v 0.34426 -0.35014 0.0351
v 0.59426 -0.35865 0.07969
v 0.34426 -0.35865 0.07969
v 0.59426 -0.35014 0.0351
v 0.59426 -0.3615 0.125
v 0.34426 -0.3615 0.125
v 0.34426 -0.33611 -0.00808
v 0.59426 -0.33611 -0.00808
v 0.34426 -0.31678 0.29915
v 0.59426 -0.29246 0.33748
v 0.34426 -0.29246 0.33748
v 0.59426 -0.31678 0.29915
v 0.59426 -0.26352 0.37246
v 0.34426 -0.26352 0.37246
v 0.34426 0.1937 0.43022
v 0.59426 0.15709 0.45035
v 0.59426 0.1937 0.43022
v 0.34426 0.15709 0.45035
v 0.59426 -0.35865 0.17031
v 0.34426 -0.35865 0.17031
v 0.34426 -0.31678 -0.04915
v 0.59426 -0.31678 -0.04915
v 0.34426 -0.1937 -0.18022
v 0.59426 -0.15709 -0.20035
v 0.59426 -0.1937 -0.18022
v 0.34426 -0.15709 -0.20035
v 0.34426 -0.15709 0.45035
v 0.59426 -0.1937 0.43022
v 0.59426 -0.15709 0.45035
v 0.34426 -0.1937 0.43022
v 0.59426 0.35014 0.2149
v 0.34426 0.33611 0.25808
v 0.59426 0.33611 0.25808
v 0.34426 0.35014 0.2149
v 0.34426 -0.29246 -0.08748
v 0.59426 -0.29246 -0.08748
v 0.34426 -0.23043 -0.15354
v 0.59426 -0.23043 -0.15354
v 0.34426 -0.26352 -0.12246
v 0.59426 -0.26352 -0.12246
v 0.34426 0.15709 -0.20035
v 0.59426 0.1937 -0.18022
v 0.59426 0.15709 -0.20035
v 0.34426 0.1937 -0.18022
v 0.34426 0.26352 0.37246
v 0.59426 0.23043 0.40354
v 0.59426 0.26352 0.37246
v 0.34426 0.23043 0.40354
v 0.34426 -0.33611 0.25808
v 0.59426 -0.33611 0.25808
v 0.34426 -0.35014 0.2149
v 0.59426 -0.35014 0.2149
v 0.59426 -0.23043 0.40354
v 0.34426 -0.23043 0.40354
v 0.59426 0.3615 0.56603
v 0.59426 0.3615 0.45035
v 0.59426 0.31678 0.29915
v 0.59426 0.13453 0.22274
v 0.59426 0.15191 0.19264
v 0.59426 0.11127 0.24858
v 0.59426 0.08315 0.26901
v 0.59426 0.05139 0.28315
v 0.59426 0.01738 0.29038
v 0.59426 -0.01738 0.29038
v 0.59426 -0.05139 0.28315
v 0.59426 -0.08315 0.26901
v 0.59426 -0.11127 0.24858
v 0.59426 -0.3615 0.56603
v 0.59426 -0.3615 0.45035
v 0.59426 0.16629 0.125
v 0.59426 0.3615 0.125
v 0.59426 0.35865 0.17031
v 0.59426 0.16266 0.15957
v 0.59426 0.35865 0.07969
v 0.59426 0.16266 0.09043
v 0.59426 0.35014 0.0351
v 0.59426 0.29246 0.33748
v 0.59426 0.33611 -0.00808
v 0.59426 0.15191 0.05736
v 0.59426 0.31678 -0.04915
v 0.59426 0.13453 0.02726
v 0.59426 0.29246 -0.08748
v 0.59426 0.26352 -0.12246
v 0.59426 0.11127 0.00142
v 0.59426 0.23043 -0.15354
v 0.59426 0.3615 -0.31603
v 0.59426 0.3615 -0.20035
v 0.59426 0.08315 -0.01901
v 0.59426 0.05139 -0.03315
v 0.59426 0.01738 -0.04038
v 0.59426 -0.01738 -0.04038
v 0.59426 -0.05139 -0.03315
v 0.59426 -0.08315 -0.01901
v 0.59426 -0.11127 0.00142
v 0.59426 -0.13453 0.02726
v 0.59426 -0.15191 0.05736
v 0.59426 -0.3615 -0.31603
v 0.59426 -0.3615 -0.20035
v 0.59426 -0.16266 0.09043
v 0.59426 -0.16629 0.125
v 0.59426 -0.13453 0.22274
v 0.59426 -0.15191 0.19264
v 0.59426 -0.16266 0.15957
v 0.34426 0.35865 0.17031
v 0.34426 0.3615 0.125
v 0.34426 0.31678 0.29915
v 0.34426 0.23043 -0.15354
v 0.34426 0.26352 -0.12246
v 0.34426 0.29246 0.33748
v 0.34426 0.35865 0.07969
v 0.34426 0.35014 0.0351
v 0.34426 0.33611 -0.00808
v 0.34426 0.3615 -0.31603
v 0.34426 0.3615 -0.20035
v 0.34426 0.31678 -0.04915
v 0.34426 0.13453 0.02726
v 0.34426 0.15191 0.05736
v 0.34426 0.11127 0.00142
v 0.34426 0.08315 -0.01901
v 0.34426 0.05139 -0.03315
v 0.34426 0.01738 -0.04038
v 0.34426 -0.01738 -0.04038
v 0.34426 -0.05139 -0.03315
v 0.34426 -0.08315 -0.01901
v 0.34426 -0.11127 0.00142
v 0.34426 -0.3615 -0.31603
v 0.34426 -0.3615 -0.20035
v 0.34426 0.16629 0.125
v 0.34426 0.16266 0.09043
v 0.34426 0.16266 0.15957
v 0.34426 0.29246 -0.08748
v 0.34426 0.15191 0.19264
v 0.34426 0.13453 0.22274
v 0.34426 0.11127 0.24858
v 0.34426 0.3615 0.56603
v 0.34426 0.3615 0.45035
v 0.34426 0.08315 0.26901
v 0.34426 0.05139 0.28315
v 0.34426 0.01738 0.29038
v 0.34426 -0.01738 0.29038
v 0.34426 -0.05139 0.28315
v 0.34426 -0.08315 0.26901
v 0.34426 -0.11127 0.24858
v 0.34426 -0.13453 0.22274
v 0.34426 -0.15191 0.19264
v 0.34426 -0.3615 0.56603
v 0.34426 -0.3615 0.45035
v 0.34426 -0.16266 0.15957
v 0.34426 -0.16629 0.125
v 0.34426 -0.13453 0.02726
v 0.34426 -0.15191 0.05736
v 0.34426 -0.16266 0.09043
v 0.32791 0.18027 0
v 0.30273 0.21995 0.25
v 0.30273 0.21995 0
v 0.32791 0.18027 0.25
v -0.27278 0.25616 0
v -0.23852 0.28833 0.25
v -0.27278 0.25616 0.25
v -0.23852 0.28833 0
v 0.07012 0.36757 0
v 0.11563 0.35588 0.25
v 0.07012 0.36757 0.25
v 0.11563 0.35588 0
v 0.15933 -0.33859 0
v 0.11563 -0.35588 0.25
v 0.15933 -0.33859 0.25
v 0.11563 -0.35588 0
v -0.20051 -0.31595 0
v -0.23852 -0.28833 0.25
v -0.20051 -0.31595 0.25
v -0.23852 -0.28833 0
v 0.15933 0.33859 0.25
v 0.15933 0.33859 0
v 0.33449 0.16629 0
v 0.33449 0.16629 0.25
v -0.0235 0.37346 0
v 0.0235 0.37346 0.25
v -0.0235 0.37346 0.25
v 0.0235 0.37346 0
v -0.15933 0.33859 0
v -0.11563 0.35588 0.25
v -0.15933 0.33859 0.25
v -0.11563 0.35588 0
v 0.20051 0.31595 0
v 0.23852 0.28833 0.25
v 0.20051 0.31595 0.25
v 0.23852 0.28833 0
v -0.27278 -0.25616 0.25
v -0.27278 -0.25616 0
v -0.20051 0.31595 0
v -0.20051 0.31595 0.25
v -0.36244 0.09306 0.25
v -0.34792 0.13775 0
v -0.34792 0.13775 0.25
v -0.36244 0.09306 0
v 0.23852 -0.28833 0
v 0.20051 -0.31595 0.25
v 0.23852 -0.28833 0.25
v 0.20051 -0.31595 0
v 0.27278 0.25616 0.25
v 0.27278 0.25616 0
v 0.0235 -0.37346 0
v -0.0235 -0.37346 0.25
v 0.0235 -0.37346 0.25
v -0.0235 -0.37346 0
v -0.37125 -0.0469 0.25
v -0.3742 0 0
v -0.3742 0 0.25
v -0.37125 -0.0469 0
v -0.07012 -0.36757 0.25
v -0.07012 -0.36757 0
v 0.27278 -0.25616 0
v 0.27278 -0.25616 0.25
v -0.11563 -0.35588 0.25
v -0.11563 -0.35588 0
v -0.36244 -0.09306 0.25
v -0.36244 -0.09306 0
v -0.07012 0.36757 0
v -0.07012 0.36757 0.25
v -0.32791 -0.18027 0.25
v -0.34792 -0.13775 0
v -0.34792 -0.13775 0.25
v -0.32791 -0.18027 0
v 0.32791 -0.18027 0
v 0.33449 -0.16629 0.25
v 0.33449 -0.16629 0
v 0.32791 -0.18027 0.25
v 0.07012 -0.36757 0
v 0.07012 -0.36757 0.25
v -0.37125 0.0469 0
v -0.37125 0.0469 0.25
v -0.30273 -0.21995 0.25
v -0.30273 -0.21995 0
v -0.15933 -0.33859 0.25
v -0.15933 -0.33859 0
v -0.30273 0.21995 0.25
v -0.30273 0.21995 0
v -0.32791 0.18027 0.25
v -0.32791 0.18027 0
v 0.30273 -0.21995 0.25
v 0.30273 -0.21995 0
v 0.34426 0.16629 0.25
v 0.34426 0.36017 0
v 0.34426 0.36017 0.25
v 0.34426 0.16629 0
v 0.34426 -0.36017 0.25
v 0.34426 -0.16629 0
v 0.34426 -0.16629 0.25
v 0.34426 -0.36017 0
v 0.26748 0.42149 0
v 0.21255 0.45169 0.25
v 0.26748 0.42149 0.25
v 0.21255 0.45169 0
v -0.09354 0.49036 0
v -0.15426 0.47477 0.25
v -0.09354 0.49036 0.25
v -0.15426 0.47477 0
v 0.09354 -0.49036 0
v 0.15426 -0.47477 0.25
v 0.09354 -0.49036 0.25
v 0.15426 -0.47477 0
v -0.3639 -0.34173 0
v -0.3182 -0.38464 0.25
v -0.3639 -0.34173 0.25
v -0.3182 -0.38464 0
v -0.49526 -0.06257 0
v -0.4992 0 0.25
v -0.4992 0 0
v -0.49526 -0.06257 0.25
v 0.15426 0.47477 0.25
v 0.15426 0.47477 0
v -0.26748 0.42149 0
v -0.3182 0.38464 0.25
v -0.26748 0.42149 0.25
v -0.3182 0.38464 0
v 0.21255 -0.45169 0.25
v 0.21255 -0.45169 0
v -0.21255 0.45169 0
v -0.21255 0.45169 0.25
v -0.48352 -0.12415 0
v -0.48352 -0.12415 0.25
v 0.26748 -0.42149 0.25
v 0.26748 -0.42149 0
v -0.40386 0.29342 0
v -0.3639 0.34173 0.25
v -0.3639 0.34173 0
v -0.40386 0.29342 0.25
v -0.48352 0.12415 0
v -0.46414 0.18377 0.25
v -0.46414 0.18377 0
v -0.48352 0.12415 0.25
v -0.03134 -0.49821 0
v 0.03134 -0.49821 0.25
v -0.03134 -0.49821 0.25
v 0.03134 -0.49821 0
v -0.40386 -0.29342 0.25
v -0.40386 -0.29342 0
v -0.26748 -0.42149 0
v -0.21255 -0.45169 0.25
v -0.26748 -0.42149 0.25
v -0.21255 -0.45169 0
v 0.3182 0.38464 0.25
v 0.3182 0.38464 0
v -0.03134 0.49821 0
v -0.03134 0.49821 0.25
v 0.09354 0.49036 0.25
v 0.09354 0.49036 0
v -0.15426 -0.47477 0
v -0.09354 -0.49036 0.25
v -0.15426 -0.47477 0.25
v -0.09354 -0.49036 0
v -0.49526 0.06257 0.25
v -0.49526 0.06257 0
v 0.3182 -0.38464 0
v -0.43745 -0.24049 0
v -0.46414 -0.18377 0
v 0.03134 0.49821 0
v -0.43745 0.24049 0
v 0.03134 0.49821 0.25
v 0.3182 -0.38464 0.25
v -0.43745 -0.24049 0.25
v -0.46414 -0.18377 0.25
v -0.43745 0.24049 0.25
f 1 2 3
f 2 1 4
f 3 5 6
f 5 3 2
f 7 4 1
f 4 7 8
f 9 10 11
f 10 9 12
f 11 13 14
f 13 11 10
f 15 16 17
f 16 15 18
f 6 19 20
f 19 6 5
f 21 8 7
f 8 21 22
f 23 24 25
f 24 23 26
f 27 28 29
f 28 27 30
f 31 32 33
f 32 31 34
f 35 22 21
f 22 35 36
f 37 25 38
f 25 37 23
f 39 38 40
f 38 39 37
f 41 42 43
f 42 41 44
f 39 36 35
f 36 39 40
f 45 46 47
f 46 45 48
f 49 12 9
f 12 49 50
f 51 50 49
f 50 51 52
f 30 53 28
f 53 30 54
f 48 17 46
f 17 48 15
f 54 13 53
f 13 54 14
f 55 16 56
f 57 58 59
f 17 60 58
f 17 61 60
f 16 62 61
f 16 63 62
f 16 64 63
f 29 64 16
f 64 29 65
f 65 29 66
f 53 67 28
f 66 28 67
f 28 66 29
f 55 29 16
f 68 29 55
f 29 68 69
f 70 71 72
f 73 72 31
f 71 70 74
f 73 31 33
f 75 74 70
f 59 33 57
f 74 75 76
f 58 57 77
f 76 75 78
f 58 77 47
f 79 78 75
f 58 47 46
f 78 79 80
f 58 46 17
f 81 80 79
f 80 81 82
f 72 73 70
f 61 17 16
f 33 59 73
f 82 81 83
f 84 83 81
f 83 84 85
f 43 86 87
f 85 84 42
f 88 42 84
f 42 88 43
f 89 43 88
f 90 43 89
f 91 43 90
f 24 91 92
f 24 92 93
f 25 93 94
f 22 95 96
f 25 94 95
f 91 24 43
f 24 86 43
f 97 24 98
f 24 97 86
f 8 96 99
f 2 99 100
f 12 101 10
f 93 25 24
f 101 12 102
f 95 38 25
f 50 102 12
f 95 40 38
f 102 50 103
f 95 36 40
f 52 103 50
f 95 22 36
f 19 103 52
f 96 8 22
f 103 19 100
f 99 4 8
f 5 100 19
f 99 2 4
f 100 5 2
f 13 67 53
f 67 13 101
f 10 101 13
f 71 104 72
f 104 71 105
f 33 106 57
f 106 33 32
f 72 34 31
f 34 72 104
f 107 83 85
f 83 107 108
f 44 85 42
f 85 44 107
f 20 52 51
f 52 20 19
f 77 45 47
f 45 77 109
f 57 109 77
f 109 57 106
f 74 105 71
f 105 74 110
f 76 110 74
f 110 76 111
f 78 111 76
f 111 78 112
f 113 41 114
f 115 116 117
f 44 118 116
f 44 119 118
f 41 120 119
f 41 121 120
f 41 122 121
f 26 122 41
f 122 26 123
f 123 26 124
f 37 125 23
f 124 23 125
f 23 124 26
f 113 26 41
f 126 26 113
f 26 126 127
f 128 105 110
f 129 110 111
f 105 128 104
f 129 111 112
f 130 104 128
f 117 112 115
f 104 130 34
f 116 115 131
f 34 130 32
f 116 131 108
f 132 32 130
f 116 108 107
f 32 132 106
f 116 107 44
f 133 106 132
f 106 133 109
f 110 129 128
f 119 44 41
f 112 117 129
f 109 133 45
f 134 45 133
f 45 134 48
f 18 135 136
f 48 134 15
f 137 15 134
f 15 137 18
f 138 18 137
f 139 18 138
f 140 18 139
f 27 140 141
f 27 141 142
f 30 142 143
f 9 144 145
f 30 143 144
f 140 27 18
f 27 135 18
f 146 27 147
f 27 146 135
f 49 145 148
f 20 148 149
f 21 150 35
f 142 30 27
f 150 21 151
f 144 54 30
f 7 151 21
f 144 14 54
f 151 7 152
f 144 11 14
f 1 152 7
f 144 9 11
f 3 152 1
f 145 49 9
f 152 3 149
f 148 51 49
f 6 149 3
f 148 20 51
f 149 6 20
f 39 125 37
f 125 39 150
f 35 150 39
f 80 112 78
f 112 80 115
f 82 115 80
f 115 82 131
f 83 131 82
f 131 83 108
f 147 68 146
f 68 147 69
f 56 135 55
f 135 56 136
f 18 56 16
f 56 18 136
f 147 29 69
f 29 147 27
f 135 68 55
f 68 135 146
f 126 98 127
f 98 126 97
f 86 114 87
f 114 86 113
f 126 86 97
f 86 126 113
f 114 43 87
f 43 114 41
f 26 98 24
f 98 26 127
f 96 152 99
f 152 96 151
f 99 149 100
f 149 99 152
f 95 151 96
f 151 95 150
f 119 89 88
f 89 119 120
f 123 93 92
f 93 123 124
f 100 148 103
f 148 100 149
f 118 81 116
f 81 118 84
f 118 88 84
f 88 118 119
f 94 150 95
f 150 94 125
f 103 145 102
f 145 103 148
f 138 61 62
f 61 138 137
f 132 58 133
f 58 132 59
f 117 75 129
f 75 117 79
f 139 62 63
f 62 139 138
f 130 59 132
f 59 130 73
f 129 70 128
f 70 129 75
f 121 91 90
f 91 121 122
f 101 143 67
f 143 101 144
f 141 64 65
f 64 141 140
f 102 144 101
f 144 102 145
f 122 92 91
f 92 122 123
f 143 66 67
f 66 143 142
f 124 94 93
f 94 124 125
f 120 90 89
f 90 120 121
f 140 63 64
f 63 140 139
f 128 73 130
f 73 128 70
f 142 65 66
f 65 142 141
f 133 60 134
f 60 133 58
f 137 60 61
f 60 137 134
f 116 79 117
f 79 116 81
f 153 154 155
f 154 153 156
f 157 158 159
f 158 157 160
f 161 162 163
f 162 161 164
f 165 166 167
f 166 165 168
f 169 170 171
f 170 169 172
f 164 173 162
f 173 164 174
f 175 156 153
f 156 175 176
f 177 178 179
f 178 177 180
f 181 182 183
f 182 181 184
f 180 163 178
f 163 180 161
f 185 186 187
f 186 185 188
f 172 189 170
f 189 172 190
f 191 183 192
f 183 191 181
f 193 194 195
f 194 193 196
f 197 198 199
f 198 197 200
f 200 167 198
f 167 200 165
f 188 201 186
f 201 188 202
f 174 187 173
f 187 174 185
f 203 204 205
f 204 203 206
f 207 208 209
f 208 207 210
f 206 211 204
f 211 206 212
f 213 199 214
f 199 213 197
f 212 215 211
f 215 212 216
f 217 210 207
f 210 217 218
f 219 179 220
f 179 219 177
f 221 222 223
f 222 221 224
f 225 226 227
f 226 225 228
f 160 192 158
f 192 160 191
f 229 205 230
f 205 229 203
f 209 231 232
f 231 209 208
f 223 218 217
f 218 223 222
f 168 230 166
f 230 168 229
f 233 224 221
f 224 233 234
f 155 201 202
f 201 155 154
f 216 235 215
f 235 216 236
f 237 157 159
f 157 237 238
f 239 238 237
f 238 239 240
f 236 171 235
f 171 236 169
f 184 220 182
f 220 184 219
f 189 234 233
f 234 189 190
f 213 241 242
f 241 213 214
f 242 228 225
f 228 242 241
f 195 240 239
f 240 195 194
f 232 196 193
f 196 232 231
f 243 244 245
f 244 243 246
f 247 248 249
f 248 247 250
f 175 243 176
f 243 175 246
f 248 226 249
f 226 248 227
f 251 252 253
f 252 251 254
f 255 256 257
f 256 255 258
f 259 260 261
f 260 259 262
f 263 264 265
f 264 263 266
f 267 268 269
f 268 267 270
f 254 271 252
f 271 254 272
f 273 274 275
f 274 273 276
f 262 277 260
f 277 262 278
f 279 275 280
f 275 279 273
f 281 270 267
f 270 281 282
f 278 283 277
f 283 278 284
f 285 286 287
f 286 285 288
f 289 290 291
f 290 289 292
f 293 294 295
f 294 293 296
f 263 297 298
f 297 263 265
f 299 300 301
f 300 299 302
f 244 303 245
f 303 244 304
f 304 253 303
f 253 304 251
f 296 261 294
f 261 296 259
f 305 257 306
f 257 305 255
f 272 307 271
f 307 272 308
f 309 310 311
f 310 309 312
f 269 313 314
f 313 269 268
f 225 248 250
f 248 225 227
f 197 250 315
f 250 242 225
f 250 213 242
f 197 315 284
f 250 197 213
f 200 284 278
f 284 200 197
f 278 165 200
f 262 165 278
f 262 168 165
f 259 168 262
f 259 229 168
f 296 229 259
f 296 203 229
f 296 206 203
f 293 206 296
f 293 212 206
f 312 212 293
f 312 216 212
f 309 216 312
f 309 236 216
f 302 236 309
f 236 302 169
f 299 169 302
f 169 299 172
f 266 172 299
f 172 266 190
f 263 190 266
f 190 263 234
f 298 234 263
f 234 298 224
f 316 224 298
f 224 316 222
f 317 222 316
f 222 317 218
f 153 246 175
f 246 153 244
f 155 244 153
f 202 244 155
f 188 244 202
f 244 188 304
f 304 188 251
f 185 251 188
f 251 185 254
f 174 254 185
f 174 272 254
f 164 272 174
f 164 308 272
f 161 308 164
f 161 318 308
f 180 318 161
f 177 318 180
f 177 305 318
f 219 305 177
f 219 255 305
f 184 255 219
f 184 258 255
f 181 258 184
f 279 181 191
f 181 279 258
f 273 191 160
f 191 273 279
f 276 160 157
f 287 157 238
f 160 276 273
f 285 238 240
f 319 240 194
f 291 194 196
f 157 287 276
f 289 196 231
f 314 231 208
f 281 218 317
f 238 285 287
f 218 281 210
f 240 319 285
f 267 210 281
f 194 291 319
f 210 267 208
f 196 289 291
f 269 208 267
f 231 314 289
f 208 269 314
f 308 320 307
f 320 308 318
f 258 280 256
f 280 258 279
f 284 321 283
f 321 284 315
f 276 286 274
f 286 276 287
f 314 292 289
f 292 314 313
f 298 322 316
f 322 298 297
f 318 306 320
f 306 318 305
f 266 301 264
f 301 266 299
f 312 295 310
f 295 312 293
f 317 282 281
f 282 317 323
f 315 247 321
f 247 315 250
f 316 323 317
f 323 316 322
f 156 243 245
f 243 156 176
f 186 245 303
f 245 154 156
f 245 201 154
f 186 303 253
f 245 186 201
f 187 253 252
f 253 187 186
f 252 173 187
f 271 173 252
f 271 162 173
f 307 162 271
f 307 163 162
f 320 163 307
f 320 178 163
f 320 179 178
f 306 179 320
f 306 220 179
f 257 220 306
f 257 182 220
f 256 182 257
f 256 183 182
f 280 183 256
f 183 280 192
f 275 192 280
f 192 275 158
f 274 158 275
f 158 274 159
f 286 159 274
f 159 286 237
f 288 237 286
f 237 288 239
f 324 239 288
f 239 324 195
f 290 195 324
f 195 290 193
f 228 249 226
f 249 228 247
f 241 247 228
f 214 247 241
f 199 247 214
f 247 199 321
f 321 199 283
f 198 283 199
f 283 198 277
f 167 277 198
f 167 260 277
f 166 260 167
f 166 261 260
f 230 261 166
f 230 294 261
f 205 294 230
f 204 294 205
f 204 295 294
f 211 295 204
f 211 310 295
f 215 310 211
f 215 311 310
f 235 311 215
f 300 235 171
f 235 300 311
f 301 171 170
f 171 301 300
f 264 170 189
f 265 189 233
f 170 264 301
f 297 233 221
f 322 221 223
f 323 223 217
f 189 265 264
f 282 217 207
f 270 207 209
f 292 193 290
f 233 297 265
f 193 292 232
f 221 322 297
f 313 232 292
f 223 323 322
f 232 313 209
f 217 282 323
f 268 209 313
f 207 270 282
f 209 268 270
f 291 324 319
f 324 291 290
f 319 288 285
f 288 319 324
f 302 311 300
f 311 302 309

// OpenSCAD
// preview[view:north east, tilt:top diagonal]

//ring size on US scale
size = 9; //[1:.5:20]

//thickness of the ring (inches from inner to outer diameter)
thickness = .125; //[.0625:.0005:.1875]

//depth of the ring (inches)
ring_depth = .25; //[.125:.0625:1]

//depth of the symbol (inches)
symbol_depth = .25; //[.125:.0625:1]

// Which part would you like to see?
part = "both"; // [both:Both,ring:Ring Only,logo:Symbol Only]

rs = size*.0326 + .455;
glod = 2*sqrt(pow((rs+2*thickness)/2,2)-pow(.46*rs,2));

print_part();

module print_part() {
	if (part == "both") {
		both();
	} else if (part == "ring") {
		ring();
	} else if (part == "logo") {
		logo();
	} else {
		both();
	}
}

module ring(){
	difference(){
		cylinder(r = rs/2+thickness, h = ring_depth, $fn=50);
		union(){
			translate([0,0,-.1])cylinder(r = rs/2, h = ring_depth+.2, $fn=50);
			translate([rs*.46,-10,-.1]) cube([5,20,ring_depth+.2]);
			translate([1,0,thickness]) cube([2,.46*glod,ring_depth+.2],center=true);
		}
	}
}

module logo(){
	difference(){
		union(){
			cylinder(r=glod/2,h=symbol_depth, $fn=50);
			translate([-glod/2,-.45*glod-.16*glod,0]){
				cube([glod,.16*glod,symbol_depth]);
			}
			translate([-glod/2,.45*glod,0]){
				cube([glod,.16*glod,symbol_depth]);
			}
		}
		union(){
			translate([0,0,-.1]) cylinder(r=.46*glod/2,h=symbol_depth+.2, $fn=30);
		}
	}
}

module both(){
	translate([(size*.0326 + .455)*.46,0,ring_depth/2]) rotate(a=90,v=[0,1,0]) rotate(a=-90,v=[0,0,1]) logo();
	ring();
}
